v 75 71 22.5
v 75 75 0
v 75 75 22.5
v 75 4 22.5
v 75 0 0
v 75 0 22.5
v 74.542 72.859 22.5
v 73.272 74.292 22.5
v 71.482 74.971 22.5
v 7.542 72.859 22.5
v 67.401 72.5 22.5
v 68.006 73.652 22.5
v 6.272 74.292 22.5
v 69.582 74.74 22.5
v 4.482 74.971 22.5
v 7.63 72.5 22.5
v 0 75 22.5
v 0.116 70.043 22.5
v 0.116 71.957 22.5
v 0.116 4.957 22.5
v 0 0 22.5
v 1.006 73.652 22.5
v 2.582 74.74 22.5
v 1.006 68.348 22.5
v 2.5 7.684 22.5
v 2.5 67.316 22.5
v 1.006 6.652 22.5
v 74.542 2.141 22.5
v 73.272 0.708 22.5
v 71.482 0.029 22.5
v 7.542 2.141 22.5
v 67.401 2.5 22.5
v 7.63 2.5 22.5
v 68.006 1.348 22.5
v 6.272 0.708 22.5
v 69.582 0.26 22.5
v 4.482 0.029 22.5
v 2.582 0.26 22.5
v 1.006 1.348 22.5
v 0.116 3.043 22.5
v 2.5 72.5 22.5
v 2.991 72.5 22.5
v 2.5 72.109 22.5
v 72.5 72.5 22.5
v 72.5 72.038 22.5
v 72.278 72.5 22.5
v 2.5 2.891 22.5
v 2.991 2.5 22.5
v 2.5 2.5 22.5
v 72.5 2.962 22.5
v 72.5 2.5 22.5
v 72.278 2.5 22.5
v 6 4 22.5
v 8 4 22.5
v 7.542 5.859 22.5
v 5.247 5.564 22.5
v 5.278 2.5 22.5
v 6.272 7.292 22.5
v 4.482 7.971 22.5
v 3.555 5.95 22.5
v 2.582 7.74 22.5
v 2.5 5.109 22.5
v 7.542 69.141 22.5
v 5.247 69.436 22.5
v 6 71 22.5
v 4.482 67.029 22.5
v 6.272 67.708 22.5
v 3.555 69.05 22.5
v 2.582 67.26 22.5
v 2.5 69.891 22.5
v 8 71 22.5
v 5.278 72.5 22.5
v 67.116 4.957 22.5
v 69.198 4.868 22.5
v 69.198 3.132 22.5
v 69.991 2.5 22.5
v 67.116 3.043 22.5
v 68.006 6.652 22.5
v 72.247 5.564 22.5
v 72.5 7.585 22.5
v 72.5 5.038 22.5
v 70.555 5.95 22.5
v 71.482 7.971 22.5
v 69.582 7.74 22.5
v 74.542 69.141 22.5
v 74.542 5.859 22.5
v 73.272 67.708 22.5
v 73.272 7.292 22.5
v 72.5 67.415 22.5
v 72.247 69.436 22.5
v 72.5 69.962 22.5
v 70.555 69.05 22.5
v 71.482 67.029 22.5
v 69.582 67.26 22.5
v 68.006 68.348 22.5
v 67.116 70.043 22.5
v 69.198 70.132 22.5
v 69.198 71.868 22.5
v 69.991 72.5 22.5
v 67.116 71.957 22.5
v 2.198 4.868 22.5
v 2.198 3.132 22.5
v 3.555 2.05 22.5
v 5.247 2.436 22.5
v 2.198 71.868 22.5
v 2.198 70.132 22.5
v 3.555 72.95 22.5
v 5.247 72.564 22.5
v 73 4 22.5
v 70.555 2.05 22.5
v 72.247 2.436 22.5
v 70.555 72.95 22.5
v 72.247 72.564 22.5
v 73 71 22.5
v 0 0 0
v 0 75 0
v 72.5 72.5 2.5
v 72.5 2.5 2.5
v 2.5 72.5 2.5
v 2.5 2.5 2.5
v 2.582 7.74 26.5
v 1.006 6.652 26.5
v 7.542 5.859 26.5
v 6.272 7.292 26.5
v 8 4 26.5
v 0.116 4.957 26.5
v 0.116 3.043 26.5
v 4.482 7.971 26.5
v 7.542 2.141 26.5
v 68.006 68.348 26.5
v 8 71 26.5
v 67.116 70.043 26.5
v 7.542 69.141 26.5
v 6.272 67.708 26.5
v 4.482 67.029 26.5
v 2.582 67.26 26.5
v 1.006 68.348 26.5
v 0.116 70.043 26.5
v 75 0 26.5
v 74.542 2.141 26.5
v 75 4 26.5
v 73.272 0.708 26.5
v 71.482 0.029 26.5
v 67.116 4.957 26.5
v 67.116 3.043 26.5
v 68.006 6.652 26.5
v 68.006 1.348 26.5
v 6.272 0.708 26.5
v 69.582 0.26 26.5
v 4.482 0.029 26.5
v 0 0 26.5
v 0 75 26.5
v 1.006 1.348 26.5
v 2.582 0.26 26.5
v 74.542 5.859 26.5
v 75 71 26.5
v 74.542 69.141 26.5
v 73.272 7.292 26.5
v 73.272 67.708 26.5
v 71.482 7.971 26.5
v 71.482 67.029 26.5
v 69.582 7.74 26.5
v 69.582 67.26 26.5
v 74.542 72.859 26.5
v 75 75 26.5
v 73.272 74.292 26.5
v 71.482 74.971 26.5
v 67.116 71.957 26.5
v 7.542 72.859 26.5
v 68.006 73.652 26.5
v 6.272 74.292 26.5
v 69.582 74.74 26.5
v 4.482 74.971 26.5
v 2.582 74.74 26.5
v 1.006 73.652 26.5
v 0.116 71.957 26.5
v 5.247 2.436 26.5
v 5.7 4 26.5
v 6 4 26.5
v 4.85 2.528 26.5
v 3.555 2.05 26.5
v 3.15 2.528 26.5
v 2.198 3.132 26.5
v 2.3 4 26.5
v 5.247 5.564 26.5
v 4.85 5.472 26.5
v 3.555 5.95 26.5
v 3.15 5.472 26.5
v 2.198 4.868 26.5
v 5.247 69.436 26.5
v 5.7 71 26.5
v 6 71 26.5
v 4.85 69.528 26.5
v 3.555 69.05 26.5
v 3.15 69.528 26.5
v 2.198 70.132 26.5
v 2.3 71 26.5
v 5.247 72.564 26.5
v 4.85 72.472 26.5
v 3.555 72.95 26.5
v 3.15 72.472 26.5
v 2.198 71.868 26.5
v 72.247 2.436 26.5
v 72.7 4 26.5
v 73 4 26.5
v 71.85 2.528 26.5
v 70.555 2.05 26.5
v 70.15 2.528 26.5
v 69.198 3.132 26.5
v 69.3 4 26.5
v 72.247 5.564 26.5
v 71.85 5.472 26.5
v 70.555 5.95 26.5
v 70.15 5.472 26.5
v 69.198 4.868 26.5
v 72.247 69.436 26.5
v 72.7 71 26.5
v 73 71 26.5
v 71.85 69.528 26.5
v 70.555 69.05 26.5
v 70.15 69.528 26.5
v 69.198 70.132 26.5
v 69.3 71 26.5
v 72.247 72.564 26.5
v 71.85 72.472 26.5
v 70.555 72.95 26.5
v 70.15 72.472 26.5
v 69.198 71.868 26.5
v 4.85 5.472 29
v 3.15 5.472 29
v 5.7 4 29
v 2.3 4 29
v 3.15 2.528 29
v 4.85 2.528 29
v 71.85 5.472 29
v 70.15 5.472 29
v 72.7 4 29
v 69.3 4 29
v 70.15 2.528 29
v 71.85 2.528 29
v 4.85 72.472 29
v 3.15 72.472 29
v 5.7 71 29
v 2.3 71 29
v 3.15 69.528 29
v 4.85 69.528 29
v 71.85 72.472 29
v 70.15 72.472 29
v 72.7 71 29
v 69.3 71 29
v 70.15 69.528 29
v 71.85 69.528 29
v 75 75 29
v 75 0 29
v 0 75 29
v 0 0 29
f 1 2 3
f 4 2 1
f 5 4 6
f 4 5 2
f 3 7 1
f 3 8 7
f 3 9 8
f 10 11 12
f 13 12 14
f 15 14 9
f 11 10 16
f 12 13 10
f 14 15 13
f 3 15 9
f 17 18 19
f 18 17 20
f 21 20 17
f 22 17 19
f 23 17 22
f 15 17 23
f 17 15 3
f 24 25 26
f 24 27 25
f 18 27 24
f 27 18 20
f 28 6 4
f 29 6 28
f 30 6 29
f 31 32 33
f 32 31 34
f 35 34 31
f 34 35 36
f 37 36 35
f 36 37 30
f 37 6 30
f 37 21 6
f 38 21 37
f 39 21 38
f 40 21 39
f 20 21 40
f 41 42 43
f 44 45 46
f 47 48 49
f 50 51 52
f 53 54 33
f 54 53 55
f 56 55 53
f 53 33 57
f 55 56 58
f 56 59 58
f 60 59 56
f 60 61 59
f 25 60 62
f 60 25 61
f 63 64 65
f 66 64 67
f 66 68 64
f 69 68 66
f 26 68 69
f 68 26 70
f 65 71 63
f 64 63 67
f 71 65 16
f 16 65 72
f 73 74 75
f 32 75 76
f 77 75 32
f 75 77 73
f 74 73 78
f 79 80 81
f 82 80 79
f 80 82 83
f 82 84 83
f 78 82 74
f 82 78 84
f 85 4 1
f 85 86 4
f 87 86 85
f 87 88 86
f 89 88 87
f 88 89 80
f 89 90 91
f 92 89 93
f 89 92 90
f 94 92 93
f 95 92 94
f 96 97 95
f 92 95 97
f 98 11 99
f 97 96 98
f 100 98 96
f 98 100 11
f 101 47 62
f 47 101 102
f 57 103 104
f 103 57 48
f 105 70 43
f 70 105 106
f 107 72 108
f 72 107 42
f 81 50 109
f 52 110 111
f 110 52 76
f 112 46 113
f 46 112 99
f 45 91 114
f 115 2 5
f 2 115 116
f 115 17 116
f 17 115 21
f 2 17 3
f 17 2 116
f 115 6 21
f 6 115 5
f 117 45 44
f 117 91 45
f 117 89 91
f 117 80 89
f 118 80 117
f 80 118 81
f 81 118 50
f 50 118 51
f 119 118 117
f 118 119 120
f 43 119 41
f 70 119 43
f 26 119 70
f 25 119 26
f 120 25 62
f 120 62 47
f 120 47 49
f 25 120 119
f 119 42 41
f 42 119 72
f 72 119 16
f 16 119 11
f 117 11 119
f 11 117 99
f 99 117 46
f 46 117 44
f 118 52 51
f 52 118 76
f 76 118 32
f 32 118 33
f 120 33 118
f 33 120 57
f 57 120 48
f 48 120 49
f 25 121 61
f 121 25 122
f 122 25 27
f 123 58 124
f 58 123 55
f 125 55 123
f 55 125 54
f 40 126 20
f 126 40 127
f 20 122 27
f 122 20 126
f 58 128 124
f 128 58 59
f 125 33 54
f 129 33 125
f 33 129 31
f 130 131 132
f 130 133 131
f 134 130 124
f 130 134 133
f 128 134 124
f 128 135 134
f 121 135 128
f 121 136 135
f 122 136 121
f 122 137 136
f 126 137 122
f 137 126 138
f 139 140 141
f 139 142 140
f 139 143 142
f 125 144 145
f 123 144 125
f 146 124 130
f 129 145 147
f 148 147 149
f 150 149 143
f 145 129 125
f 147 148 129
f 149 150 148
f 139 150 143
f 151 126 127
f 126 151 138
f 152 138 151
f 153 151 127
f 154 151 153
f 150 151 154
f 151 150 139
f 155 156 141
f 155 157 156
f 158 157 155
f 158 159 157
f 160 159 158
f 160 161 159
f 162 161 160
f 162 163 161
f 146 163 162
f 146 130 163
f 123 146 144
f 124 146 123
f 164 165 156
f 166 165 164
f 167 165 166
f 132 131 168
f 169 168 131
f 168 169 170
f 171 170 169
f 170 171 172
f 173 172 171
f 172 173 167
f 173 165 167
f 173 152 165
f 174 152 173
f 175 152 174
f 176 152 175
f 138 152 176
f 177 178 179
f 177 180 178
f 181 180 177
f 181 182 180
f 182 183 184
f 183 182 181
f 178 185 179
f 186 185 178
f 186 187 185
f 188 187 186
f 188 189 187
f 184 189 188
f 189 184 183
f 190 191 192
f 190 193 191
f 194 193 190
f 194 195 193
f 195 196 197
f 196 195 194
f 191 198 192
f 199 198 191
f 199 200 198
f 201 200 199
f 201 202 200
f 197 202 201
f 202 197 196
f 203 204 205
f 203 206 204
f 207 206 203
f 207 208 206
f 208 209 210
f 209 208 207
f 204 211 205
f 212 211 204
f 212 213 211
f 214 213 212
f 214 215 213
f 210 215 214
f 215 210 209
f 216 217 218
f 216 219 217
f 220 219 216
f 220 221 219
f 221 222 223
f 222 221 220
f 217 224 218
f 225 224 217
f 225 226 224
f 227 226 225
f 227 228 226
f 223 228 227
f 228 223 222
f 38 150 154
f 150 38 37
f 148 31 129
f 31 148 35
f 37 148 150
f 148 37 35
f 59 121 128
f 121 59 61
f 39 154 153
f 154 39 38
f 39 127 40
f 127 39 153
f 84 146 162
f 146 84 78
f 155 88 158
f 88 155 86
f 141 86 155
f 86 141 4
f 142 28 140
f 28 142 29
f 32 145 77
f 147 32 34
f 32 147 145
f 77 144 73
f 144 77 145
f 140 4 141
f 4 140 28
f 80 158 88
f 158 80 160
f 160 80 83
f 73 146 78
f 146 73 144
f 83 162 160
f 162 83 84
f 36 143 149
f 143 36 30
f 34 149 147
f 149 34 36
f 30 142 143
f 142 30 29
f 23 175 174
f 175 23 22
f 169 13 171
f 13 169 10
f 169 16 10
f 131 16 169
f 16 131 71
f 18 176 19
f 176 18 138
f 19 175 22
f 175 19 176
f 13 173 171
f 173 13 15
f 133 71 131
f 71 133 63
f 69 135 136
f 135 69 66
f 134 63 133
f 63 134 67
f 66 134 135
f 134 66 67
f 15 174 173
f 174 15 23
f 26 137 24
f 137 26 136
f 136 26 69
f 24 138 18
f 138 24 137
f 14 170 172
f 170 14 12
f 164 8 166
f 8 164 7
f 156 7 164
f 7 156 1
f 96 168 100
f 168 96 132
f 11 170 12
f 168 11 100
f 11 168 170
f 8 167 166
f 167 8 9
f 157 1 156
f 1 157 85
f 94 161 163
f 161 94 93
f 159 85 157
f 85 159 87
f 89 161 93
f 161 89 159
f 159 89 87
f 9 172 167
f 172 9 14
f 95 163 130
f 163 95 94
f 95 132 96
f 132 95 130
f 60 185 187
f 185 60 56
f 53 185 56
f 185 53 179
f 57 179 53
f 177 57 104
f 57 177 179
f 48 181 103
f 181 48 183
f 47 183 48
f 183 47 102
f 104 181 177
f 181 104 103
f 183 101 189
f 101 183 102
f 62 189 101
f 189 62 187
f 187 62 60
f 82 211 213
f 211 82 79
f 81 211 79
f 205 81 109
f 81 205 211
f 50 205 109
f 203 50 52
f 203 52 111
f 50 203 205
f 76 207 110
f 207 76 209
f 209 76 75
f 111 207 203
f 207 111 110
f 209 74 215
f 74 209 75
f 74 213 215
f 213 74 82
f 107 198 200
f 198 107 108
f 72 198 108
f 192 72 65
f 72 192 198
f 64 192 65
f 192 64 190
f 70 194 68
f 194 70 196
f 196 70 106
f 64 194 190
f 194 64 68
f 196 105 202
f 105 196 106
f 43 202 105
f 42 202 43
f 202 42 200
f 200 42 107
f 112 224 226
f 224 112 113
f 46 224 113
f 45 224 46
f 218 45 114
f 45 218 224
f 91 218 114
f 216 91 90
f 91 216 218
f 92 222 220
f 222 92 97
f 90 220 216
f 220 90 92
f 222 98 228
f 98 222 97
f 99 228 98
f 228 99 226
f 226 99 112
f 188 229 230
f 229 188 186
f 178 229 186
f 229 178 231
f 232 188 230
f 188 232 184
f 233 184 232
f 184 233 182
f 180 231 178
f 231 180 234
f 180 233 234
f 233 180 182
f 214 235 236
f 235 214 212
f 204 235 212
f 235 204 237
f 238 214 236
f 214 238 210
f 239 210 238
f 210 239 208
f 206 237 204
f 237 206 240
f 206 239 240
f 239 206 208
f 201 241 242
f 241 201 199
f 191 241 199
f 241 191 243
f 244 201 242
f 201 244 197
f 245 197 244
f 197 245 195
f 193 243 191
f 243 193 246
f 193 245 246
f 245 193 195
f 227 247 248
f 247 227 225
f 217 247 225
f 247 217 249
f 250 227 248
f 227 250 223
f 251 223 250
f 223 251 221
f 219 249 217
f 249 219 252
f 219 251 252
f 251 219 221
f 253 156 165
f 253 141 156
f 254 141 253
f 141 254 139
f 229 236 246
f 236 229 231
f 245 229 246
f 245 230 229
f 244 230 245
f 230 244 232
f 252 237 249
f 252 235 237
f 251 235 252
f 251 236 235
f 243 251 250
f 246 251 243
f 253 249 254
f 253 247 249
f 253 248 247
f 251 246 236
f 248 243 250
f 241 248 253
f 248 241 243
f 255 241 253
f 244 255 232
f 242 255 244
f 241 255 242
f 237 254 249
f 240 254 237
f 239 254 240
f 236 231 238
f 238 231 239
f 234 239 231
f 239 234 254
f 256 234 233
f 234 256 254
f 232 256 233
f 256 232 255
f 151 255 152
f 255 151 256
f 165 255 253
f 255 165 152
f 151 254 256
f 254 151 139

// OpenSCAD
// Enclosure with M3 heat-set inserts and socket-head cap screws
// Internal cavity: 70 x 70 x 20 mm; wall thickness: 2.5 mm
// BOM: 4x MB-SHCS-M3-08, 4x MB-HSI-M3

outer_x = 75;
outer_y = 75;
cavity_x = 70;
cavity_y = 70;
cavity_z = 20;
wall_thickness = 2.5;
base_z = 22.5;

boss_height = 4;
boss_dia = 8;
insert_hole_dia = 4.0;
lid_thickness = 2.5;
clearance_hole_dia = 3.4;

boss_pos = [[4, 4], [71, 4], [4, 71], [71, 71]];

module base() {
    cavity_offset = (outer_x - cavity_x) / 2;
    
    difference() {
        cube([outer_x, outer_y, base_z], center = false);
        translate([cavity_offset, cavity_offset, wall_thickness])
            cube([cavity_x, cavity_y, cavity_z], center = false);
    }
    
    difference() {
        for (p = boss_pos)
            translate([p[0], p[1], base_z])
                cylinder(d = boss_dia, h = boss_height, center = false);
        
        for (p = boss_pos)
            translate([p[0], p[1], base_z])
                cylinder(d = insert_hole_dia, h = boss_height, center = false);
    }
}

module lid() {
    difference() {
        cube([outer_x, outer_y, lid_thickness], center = false);
        
        for (p = boss_pos)
            translate([p[0], p[1], -0.1])
                cylinder(d = clearance_hole_dia, h = lid_thickness + 0.2, center = false);
    }
}

color([0.8, 0.8, 0.8, 0.9])
    base();

color([0.6, 0.6, 0.6, 0.8])
    translate([0, 0, base_z + boss_height])
        lid();
